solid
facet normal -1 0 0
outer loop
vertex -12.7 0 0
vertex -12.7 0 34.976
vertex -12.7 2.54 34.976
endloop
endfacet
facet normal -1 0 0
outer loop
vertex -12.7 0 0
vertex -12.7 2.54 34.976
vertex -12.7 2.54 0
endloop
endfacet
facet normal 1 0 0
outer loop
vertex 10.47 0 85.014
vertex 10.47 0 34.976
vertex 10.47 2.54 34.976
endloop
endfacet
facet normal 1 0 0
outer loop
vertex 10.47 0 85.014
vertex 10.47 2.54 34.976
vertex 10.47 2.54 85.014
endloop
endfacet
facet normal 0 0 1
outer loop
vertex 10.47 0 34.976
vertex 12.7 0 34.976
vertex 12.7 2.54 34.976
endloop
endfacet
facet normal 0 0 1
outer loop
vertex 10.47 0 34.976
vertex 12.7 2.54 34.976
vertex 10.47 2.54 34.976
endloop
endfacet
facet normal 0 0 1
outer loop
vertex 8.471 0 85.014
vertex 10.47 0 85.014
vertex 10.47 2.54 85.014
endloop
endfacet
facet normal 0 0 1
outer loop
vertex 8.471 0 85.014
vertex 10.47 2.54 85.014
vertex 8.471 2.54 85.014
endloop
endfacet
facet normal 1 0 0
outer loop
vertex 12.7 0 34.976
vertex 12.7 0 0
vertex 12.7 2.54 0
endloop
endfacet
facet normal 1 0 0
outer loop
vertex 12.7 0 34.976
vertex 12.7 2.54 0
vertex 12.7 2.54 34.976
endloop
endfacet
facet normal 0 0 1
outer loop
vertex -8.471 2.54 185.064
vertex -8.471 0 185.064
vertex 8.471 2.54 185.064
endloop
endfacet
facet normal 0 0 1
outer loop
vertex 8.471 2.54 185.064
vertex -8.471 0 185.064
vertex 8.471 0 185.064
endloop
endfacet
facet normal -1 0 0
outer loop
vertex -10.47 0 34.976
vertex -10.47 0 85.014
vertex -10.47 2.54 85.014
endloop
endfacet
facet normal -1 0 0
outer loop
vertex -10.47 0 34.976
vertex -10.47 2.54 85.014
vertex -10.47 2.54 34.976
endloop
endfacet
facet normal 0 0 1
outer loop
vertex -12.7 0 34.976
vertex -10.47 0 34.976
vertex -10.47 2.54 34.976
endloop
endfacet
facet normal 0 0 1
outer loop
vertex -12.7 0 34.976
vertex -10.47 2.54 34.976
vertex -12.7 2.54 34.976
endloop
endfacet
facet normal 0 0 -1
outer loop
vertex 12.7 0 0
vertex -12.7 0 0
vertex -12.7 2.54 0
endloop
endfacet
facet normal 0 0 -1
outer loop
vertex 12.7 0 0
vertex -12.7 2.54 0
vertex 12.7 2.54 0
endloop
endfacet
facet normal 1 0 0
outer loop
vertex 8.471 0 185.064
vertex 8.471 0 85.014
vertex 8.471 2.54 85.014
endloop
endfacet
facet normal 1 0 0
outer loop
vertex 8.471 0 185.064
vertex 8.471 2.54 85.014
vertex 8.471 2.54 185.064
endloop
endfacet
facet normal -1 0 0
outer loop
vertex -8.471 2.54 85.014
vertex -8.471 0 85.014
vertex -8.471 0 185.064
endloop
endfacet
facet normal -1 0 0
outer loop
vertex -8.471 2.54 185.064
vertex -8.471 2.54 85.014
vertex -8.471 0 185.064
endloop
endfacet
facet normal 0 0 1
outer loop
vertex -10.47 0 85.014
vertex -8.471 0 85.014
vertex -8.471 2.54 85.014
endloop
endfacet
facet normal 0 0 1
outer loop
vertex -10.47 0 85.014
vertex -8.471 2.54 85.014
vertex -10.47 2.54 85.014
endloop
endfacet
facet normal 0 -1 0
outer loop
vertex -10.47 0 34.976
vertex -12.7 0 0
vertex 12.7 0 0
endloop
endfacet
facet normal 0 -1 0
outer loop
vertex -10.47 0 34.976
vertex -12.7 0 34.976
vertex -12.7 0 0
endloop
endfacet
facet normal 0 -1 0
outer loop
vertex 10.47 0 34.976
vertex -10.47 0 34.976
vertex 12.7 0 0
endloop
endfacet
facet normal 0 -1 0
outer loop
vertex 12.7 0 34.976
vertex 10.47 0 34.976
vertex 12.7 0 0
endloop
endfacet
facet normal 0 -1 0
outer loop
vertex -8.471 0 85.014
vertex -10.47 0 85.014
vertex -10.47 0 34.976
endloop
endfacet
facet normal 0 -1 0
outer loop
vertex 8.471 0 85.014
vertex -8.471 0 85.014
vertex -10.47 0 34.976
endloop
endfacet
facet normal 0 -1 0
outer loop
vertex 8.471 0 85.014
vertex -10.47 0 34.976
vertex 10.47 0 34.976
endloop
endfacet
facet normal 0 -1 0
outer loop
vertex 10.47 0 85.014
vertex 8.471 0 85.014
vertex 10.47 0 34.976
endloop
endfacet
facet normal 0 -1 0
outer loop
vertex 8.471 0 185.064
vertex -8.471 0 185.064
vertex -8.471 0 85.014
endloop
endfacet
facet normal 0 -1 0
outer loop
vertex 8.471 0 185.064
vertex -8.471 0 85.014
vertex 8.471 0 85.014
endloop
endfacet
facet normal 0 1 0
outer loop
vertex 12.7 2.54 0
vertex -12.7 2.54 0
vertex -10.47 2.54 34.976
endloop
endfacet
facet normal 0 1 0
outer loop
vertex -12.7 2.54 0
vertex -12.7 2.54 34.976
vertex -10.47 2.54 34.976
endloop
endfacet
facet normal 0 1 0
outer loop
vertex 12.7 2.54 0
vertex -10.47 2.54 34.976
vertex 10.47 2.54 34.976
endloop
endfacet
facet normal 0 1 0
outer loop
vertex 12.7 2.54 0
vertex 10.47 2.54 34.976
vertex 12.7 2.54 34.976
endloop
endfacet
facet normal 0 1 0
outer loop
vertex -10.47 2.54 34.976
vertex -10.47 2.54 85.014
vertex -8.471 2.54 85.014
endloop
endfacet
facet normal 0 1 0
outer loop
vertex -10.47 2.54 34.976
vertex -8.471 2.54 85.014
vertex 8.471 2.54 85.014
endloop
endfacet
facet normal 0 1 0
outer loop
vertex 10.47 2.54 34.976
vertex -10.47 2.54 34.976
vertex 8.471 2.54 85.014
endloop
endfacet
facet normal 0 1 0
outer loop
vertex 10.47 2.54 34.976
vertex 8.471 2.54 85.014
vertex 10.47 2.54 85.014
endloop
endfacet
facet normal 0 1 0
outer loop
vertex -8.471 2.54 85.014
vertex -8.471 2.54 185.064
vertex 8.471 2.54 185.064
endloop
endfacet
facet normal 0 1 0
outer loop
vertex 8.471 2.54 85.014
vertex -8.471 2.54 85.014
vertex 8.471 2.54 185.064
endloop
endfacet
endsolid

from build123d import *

# Parameters (mm, degrees)
F0_W     = 16.9418
F0_H     = 100.0506
F1_DEPTH = 2.54


with BuildPart() as f1:
    # F0 (on Front) → F1 (new body)
    with BuildSketch(Plane.XZ):
        Polygon((-12.7, 0), (0, 0), (12.7, 0), (12.7, 34.9758), (10.469878, 34.9758), (-10.469878, 34.9758), (-12.7, 34.9758), align=None)
        Polygon((-10.469878, 85.0138), (-10.469878, 34.9758), (10.469878, 34.9758), (10.469878, 85.0138), (8.4709, 85.0138), (-8.4709, 85.0138), align=None)
        with Locations((0, 135.0391)):
            Rectangle(F0_W, F0_H)
    extrude(amount=-F1_DEPTH)


solid = f1.part
